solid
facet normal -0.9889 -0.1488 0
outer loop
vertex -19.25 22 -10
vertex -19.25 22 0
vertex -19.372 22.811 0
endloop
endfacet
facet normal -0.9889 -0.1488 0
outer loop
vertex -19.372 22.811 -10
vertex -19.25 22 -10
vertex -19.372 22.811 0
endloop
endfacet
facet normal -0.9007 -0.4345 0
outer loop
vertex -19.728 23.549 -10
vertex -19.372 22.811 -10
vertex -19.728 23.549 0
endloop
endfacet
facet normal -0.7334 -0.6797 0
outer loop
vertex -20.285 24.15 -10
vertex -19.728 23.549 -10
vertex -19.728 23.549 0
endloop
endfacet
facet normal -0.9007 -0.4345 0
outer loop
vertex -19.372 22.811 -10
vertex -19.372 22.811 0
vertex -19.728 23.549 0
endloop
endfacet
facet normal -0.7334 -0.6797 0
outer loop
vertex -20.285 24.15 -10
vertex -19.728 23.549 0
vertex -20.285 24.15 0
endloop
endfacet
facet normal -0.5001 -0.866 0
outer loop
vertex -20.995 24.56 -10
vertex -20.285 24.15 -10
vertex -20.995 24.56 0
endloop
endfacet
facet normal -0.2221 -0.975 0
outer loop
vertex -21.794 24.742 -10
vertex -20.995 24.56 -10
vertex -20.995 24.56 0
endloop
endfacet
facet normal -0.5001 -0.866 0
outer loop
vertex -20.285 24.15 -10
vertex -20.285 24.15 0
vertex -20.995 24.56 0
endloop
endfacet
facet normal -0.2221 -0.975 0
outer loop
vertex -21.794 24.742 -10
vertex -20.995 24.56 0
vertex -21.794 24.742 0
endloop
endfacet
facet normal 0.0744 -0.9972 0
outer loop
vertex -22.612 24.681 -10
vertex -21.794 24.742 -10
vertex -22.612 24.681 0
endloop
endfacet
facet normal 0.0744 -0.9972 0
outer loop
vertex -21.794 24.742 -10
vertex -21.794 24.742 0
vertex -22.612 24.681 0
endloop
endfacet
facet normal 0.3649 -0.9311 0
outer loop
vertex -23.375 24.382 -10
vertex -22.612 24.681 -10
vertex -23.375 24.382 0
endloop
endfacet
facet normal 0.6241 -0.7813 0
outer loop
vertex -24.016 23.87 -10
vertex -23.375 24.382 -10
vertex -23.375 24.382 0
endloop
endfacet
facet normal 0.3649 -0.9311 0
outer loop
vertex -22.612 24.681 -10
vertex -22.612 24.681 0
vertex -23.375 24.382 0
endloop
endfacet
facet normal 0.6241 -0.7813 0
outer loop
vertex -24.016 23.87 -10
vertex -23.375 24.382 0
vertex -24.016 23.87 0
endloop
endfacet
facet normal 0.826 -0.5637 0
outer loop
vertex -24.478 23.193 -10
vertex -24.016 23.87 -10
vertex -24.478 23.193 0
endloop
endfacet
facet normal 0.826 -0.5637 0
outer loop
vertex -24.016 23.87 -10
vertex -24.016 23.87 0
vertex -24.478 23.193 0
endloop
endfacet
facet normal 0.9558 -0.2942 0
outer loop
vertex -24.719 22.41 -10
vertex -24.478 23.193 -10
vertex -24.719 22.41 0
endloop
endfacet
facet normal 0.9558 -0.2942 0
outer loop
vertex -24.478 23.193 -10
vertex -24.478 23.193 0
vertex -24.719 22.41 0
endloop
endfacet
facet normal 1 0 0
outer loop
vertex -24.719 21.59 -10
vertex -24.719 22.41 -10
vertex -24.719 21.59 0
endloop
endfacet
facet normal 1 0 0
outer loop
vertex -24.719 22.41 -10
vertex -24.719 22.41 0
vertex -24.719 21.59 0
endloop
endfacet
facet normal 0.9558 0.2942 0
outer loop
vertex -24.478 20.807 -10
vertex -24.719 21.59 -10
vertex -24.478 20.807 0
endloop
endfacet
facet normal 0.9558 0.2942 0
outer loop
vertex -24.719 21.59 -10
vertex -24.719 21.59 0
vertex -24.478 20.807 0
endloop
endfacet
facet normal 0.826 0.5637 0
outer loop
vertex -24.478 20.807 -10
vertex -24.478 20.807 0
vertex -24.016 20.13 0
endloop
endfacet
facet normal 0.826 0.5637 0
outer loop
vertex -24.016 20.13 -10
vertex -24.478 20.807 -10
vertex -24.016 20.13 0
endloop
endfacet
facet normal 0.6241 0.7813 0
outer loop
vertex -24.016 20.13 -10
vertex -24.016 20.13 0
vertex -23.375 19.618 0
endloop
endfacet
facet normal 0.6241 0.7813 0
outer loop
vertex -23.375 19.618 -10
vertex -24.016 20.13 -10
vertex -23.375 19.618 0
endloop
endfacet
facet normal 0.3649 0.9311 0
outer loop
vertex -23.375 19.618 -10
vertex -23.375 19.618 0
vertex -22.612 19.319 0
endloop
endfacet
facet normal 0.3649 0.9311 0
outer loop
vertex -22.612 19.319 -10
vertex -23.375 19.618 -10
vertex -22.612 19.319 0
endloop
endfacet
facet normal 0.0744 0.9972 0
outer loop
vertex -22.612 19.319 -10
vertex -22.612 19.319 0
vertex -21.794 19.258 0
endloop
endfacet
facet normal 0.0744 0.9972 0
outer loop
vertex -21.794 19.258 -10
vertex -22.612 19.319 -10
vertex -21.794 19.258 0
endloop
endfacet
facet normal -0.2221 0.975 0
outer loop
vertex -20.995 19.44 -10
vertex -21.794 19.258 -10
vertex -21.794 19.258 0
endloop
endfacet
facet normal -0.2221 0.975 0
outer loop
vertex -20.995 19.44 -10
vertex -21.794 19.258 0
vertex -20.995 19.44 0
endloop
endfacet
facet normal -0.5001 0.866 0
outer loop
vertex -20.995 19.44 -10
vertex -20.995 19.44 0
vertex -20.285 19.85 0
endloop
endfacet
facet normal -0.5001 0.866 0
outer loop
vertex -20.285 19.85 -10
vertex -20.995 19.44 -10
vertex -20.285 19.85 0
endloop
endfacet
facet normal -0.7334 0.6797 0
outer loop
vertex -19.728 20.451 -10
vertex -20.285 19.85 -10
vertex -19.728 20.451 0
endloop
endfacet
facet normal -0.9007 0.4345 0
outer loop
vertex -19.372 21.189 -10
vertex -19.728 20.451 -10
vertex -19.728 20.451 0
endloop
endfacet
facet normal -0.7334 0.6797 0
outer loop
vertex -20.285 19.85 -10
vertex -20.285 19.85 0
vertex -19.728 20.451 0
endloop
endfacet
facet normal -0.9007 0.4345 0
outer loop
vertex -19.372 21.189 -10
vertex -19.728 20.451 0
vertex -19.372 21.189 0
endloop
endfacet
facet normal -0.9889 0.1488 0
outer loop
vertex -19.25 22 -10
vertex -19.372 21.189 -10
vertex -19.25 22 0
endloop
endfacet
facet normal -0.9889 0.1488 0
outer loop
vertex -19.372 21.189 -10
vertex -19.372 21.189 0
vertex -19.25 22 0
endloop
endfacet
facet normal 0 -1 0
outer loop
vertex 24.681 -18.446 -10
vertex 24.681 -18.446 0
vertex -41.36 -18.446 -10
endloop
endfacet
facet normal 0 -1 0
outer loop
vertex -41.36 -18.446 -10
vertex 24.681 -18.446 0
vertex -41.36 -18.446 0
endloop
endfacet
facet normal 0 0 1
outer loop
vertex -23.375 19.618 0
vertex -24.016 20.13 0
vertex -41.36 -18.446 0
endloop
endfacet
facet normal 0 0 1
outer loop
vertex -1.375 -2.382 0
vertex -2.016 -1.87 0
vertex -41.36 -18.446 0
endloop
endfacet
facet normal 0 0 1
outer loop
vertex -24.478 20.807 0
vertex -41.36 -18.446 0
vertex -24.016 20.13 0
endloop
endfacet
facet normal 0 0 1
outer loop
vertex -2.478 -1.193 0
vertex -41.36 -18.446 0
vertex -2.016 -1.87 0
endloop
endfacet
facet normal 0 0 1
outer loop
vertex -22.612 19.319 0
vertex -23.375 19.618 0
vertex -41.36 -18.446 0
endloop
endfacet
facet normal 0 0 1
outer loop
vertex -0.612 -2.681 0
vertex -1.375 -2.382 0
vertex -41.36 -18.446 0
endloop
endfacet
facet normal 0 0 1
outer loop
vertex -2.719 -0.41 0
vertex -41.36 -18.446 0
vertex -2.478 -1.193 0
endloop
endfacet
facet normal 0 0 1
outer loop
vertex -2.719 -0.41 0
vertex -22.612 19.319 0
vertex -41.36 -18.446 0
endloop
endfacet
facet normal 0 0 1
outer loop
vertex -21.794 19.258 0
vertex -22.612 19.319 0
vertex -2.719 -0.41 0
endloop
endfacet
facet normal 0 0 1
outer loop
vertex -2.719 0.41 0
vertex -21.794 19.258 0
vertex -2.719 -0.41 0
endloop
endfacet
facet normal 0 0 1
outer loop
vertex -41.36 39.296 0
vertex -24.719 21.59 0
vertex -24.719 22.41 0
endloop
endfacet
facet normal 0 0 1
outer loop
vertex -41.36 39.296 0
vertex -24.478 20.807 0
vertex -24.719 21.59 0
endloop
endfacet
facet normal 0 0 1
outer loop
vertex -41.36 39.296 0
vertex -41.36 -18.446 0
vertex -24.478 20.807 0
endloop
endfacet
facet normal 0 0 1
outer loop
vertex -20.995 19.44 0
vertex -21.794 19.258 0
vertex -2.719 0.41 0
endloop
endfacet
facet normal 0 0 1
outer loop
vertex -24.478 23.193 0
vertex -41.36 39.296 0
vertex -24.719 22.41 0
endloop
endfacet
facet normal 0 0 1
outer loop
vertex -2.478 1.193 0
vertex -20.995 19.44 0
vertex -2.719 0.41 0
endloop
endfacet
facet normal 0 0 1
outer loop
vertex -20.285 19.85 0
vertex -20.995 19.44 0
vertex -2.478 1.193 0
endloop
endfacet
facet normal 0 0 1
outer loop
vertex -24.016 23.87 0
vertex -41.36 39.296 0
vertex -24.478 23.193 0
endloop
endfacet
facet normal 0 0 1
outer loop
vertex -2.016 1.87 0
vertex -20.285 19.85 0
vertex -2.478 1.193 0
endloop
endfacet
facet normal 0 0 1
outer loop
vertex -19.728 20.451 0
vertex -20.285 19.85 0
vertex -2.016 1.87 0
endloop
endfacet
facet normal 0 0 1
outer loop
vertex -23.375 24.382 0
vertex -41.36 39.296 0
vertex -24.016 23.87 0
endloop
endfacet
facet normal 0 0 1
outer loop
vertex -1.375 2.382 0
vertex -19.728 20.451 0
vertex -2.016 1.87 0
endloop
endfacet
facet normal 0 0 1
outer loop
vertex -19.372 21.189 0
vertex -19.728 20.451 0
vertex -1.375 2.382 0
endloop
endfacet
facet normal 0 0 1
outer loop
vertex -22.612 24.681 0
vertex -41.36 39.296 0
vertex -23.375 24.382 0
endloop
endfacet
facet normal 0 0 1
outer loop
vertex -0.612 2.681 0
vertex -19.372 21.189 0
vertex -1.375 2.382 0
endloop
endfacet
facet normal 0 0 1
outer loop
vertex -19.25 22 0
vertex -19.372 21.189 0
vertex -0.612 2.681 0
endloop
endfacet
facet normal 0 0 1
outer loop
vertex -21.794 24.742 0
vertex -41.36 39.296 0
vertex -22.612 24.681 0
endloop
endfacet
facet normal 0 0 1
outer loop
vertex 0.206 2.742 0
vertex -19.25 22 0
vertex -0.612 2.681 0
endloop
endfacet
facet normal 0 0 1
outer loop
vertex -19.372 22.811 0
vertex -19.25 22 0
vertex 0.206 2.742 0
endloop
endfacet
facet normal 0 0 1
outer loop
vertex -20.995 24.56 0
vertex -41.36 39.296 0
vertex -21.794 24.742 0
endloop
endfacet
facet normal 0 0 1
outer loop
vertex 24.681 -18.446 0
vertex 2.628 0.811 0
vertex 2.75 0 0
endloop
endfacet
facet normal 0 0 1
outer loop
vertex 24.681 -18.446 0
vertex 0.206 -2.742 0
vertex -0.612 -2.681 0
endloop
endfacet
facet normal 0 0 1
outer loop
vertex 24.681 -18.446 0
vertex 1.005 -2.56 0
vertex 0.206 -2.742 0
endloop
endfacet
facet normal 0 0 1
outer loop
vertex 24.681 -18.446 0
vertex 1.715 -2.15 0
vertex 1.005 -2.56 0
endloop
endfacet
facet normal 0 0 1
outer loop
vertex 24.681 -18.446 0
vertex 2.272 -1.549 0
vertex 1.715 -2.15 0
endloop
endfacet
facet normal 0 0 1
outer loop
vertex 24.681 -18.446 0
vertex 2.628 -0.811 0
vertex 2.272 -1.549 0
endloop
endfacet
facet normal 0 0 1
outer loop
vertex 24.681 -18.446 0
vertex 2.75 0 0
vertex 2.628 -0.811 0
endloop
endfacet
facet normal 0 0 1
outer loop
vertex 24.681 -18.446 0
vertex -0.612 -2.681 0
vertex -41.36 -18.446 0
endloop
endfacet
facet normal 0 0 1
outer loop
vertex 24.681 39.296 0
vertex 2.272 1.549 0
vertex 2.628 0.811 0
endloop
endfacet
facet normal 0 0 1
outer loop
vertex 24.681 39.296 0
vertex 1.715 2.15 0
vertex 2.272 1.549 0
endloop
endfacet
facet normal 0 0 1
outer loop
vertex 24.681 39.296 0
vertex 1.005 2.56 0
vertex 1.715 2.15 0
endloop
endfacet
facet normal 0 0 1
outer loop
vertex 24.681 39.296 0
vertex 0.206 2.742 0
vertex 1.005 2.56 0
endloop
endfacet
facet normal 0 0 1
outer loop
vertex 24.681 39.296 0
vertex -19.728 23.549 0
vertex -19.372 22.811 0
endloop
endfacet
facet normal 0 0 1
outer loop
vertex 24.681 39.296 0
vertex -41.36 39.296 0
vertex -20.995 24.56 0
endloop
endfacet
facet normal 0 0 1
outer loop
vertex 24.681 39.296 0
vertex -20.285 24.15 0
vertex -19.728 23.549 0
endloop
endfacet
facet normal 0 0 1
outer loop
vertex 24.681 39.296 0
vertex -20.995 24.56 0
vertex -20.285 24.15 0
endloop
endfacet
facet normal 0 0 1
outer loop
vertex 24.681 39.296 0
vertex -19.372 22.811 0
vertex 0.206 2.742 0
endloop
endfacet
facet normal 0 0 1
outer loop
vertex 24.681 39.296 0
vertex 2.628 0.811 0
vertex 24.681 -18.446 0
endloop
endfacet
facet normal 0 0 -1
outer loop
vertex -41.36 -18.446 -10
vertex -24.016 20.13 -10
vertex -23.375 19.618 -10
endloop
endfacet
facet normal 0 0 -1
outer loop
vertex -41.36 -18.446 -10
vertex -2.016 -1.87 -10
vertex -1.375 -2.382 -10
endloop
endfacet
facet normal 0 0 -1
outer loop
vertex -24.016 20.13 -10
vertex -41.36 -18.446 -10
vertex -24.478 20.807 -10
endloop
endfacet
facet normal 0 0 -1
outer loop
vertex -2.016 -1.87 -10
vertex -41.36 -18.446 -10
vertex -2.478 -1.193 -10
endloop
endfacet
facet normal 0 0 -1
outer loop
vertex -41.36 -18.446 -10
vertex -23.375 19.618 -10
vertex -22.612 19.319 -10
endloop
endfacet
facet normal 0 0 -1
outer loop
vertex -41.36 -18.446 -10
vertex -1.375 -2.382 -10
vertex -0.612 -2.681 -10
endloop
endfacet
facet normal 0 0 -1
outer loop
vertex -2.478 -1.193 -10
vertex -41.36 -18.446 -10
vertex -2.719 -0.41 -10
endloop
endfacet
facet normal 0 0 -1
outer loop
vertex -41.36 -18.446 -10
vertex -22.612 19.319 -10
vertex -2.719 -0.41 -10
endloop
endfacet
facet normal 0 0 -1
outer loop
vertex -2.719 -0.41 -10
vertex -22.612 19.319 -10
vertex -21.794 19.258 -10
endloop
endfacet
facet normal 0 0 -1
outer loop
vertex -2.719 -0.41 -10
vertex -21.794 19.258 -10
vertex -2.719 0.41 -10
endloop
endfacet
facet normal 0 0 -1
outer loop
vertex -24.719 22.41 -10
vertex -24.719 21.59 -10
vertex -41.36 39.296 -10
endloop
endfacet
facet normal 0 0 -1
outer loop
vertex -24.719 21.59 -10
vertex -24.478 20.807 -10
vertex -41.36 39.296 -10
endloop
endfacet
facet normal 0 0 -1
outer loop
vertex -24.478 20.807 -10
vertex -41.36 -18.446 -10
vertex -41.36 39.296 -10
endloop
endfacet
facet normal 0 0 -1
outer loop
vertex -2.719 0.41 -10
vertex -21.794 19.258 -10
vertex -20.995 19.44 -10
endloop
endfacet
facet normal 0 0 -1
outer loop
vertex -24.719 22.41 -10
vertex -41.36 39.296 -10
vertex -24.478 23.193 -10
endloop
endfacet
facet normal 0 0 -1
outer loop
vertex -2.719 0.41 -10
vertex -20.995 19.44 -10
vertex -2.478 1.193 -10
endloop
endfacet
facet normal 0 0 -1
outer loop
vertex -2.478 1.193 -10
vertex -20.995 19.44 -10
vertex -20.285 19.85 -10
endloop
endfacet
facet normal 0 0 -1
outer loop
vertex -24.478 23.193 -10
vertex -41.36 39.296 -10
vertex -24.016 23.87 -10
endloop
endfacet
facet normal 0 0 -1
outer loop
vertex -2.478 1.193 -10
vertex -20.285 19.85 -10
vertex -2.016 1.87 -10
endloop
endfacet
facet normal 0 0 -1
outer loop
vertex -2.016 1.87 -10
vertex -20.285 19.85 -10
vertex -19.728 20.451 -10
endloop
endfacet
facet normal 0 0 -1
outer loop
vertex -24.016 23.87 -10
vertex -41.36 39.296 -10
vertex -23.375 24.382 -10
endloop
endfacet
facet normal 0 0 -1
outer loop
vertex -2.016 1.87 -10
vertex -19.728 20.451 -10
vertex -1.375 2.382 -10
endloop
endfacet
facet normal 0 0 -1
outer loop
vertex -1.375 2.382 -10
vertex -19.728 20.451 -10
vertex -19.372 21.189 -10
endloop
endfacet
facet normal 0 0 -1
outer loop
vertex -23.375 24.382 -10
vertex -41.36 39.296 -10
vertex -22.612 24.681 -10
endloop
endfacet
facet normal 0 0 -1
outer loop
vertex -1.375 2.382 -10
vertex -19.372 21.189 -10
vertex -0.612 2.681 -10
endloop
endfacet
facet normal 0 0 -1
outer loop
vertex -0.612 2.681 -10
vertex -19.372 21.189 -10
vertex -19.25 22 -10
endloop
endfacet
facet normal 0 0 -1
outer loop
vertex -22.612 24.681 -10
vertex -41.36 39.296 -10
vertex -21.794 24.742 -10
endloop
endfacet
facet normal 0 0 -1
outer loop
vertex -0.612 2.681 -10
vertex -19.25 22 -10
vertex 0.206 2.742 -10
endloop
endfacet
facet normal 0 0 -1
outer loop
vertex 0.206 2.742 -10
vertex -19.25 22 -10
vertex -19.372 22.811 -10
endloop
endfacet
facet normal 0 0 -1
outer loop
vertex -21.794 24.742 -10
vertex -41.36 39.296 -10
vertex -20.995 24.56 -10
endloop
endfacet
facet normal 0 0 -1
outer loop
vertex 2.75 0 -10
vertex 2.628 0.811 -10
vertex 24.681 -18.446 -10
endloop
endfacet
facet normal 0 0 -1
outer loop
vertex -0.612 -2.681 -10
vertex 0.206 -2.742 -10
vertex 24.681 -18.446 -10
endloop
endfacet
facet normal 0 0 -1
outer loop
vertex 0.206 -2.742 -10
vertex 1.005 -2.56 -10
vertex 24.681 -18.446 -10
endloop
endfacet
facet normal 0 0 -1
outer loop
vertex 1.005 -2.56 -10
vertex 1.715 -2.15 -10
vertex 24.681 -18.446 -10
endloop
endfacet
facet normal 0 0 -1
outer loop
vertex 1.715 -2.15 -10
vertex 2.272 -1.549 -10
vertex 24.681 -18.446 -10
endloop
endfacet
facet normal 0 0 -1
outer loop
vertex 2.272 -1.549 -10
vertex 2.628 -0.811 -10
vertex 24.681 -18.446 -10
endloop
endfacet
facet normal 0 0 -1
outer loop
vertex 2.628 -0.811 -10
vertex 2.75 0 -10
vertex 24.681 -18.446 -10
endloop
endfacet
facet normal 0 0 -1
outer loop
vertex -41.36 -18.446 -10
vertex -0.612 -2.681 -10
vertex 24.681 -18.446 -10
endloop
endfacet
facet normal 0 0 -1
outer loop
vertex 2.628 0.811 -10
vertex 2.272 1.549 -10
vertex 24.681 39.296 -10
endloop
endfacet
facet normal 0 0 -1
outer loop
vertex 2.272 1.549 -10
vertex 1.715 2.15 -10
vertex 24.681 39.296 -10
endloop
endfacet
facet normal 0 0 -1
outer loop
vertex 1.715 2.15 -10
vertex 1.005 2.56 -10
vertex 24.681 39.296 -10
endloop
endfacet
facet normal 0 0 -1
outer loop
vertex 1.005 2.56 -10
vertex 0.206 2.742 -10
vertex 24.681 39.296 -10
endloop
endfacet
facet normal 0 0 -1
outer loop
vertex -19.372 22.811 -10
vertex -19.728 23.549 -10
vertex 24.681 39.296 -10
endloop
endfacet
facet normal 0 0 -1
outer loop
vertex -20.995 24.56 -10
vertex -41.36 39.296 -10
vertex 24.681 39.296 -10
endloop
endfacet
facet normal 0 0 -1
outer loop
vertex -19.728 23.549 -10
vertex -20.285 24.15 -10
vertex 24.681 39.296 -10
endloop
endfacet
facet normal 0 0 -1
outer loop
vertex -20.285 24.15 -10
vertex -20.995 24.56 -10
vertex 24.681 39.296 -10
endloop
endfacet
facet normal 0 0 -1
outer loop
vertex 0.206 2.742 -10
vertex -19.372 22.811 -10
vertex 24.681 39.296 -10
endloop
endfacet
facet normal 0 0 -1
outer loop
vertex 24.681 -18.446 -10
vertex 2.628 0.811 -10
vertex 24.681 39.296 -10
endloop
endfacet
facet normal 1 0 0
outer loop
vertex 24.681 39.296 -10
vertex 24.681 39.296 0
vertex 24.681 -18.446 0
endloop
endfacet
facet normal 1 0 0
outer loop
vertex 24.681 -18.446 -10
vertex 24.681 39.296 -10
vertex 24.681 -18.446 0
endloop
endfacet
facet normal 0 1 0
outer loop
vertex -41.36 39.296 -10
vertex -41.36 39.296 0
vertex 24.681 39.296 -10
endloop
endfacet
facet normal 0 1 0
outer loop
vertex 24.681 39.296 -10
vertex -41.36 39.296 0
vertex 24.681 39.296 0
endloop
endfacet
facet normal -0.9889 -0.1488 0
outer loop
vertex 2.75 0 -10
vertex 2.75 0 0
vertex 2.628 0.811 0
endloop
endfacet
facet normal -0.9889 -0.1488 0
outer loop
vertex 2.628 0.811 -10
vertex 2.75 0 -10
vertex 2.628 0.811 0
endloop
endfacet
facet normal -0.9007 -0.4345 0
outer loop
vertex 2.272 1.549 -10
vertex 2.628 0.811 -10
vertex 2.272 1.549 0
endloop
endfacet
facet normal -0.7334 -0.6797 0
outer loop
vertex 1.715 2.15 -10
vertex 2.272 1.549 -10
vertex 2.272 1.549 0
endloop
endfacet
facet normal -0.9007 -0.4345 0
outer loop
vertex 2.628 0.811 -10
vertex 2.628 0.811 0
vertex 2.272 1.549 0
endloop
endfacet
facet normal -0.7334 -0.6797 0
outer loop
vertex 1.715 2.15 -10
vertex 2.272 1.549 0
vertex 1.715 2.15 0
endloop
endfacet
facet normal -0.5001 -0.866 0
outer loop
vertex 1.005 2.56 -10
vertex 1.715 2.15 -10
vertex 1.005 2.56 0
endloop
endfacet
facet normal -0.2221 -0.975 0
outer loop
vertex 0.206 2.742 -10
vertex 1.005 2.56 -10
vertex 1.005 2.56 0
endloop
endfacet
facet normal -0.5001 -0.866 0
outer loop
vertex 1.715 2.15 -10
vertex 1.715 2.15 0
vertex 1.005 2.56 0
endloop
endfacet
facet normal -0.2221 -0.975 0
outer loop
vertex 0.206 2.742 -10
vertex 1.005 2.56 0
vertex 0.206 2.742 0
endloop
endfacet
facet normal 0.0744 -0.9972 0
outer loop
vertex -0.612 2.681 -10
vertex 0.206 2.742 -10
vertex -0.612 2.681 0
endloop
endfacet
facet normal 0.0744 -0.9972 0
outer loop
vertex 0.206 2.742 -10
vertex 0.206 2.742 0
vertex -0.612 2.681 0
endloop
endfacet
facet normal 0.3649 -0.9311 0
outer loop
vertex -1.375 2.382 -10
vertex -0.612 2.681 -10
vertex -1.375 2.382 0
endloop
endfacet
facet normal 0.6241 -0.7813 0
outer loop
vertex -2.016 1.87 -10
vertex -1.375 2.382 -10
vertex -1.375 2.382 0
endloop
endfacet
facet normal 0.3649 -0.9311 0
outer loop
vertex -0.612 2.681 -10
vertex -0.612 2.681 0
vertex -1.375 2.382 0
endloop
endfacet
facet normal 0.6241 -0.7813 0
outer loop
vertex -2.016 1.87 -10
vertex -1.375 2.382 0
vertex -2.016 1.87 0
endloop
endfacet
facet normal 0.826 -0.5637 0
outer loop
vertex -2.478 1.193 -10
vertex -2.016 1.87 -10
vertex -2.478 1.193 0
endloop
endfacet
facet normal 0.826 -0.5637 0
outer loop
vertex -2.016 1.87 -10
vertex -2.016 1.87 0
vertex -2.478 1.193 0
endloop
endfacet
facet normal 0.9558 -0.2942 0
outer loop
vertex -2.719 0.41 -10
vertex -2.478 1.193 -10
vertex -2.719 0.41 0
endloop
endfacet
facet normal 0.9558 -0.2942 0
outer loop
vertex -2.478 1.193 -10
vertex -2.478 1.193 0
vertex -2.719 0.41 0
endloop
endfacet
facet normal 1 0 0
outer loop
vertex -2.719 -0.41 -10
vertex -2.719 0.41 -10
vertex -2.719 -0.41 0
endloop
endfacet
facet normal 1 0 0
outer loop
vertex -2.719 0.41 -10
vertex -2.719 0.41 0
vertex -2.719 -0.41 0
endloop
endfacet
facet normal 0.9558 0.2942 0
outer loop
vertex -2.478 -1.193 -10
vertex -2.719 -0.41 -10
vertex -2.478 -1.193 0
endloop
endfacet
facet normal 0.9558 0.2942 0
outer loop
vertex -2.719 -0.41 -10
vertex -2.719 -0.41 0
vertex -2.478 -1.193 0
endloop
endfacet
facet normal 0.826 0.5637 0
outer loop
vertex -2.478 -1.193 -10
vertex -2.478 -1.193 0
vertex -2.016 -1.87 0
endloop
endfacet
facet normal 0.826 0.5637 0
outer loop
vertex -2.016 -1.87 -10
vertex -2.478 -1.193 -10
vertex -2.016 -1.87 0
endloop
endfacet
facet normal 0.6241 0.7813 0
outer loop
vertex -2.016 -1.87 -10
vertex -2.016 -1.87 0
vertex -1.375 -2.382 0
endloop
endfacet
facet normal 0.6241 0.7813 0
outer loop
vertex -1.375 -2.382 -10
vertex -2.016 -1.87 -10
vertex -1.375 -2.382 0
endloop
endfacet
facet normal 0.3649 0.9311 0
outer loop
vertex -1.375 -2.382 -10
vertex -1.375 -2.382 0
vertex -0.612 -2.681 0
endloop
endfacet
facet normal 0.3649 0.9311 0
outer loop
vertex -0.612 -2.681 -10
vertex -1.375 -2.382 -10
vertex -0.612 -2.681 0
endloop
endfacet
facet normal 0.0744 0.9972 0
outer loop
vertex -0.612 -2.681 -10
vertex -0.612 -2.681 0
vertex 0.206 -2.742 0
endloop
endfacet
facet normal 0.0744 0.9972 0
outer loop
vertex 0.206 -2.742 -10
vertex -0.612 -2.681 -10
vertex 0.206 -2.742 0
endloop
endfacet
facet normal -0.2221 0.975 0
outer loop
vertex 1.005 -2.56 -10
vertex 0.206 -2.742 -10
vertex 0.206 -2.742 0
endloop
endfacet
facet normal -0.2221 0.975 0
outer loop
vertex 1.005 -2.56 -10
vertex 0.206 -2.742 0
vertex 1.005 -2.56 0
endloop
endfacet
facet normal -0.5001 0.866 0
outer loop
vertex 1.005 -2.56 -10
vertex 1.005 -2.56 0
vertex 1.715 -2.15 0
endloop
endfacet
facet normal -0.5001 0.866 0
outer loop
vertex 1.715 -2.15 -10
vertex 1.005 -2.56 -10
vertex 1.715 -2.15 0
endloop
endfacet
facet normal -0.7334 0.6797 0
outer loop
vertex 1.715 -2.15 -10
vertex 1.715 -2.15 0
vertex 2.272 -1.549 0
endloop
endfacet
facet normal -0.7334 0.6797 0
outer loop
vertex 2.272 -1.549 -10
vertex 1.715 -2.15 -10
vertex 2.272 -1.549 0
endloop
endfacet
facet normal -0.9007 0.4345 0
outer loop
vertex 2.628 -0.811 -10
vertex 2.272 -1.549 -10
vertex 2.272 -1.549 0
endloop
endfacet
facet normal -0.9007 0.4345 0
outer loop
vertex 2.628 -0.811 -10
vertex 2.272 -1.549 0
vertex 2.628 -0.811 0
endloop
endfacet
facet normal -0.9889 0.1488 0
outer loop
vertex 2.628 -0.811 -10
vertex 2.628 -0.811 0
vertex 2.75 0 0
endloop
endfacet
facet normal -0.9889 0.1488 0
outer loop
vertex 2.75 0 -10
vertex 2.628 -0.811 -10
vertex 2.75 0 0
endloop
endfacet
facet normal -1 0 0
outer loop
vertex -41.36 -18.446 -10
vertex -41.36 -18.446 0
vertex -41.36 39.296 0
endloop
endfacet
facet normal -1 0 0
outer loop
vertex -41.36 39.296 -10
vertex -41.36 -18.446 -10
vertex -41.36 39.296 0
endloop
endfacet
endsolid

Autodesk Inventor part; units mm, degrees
ref_plane "YZ Plane" through (0, 0, 0) normal (1, 0, 0) x (0, 1, 0)
ref_plane "XZ Plane" through (0, 0, 0) normal (0, 1, 0) x (-1, 0, 0)
ref_plane "XY Plane" through (0, 0, 0) normal (0, 0, 1) x (1, 0, 0)
sketch "Sketch1" plane through (0, 0, 0) normal (0, 0, 1) x (1, 0, 0)
  circle A0 centre (0, 0) radius 2.75
  circle A1 centre (-22, 22) radius 2.75
  circle A2 centre (0, 0) radius 11 construction
  circle A3 centre (-22, 22) radius 11 construction
  line L0 (-41.3602, 39.2963) -> (24.6813, 39.2963)
  line L1 (24.6813, 39.2963) -> (24.6813, -18.4462)
  line L2 (24.6813, -18.4462) -> (-41.3602, -18.4462)
  line L3 (-41.3602, -18.4462) -> (-41.3602, 39.2963)
  dimension "d0" = 5.5
  dimension "d1" = 5.5
  dimension "d2" = 22
  dimension "d3" = 22
  dimension "d4" = 22
extrude "Extrusion1" add sketch "Sketch1" against normal blind 10
properties part number "rearSwingarmBaseV1"
